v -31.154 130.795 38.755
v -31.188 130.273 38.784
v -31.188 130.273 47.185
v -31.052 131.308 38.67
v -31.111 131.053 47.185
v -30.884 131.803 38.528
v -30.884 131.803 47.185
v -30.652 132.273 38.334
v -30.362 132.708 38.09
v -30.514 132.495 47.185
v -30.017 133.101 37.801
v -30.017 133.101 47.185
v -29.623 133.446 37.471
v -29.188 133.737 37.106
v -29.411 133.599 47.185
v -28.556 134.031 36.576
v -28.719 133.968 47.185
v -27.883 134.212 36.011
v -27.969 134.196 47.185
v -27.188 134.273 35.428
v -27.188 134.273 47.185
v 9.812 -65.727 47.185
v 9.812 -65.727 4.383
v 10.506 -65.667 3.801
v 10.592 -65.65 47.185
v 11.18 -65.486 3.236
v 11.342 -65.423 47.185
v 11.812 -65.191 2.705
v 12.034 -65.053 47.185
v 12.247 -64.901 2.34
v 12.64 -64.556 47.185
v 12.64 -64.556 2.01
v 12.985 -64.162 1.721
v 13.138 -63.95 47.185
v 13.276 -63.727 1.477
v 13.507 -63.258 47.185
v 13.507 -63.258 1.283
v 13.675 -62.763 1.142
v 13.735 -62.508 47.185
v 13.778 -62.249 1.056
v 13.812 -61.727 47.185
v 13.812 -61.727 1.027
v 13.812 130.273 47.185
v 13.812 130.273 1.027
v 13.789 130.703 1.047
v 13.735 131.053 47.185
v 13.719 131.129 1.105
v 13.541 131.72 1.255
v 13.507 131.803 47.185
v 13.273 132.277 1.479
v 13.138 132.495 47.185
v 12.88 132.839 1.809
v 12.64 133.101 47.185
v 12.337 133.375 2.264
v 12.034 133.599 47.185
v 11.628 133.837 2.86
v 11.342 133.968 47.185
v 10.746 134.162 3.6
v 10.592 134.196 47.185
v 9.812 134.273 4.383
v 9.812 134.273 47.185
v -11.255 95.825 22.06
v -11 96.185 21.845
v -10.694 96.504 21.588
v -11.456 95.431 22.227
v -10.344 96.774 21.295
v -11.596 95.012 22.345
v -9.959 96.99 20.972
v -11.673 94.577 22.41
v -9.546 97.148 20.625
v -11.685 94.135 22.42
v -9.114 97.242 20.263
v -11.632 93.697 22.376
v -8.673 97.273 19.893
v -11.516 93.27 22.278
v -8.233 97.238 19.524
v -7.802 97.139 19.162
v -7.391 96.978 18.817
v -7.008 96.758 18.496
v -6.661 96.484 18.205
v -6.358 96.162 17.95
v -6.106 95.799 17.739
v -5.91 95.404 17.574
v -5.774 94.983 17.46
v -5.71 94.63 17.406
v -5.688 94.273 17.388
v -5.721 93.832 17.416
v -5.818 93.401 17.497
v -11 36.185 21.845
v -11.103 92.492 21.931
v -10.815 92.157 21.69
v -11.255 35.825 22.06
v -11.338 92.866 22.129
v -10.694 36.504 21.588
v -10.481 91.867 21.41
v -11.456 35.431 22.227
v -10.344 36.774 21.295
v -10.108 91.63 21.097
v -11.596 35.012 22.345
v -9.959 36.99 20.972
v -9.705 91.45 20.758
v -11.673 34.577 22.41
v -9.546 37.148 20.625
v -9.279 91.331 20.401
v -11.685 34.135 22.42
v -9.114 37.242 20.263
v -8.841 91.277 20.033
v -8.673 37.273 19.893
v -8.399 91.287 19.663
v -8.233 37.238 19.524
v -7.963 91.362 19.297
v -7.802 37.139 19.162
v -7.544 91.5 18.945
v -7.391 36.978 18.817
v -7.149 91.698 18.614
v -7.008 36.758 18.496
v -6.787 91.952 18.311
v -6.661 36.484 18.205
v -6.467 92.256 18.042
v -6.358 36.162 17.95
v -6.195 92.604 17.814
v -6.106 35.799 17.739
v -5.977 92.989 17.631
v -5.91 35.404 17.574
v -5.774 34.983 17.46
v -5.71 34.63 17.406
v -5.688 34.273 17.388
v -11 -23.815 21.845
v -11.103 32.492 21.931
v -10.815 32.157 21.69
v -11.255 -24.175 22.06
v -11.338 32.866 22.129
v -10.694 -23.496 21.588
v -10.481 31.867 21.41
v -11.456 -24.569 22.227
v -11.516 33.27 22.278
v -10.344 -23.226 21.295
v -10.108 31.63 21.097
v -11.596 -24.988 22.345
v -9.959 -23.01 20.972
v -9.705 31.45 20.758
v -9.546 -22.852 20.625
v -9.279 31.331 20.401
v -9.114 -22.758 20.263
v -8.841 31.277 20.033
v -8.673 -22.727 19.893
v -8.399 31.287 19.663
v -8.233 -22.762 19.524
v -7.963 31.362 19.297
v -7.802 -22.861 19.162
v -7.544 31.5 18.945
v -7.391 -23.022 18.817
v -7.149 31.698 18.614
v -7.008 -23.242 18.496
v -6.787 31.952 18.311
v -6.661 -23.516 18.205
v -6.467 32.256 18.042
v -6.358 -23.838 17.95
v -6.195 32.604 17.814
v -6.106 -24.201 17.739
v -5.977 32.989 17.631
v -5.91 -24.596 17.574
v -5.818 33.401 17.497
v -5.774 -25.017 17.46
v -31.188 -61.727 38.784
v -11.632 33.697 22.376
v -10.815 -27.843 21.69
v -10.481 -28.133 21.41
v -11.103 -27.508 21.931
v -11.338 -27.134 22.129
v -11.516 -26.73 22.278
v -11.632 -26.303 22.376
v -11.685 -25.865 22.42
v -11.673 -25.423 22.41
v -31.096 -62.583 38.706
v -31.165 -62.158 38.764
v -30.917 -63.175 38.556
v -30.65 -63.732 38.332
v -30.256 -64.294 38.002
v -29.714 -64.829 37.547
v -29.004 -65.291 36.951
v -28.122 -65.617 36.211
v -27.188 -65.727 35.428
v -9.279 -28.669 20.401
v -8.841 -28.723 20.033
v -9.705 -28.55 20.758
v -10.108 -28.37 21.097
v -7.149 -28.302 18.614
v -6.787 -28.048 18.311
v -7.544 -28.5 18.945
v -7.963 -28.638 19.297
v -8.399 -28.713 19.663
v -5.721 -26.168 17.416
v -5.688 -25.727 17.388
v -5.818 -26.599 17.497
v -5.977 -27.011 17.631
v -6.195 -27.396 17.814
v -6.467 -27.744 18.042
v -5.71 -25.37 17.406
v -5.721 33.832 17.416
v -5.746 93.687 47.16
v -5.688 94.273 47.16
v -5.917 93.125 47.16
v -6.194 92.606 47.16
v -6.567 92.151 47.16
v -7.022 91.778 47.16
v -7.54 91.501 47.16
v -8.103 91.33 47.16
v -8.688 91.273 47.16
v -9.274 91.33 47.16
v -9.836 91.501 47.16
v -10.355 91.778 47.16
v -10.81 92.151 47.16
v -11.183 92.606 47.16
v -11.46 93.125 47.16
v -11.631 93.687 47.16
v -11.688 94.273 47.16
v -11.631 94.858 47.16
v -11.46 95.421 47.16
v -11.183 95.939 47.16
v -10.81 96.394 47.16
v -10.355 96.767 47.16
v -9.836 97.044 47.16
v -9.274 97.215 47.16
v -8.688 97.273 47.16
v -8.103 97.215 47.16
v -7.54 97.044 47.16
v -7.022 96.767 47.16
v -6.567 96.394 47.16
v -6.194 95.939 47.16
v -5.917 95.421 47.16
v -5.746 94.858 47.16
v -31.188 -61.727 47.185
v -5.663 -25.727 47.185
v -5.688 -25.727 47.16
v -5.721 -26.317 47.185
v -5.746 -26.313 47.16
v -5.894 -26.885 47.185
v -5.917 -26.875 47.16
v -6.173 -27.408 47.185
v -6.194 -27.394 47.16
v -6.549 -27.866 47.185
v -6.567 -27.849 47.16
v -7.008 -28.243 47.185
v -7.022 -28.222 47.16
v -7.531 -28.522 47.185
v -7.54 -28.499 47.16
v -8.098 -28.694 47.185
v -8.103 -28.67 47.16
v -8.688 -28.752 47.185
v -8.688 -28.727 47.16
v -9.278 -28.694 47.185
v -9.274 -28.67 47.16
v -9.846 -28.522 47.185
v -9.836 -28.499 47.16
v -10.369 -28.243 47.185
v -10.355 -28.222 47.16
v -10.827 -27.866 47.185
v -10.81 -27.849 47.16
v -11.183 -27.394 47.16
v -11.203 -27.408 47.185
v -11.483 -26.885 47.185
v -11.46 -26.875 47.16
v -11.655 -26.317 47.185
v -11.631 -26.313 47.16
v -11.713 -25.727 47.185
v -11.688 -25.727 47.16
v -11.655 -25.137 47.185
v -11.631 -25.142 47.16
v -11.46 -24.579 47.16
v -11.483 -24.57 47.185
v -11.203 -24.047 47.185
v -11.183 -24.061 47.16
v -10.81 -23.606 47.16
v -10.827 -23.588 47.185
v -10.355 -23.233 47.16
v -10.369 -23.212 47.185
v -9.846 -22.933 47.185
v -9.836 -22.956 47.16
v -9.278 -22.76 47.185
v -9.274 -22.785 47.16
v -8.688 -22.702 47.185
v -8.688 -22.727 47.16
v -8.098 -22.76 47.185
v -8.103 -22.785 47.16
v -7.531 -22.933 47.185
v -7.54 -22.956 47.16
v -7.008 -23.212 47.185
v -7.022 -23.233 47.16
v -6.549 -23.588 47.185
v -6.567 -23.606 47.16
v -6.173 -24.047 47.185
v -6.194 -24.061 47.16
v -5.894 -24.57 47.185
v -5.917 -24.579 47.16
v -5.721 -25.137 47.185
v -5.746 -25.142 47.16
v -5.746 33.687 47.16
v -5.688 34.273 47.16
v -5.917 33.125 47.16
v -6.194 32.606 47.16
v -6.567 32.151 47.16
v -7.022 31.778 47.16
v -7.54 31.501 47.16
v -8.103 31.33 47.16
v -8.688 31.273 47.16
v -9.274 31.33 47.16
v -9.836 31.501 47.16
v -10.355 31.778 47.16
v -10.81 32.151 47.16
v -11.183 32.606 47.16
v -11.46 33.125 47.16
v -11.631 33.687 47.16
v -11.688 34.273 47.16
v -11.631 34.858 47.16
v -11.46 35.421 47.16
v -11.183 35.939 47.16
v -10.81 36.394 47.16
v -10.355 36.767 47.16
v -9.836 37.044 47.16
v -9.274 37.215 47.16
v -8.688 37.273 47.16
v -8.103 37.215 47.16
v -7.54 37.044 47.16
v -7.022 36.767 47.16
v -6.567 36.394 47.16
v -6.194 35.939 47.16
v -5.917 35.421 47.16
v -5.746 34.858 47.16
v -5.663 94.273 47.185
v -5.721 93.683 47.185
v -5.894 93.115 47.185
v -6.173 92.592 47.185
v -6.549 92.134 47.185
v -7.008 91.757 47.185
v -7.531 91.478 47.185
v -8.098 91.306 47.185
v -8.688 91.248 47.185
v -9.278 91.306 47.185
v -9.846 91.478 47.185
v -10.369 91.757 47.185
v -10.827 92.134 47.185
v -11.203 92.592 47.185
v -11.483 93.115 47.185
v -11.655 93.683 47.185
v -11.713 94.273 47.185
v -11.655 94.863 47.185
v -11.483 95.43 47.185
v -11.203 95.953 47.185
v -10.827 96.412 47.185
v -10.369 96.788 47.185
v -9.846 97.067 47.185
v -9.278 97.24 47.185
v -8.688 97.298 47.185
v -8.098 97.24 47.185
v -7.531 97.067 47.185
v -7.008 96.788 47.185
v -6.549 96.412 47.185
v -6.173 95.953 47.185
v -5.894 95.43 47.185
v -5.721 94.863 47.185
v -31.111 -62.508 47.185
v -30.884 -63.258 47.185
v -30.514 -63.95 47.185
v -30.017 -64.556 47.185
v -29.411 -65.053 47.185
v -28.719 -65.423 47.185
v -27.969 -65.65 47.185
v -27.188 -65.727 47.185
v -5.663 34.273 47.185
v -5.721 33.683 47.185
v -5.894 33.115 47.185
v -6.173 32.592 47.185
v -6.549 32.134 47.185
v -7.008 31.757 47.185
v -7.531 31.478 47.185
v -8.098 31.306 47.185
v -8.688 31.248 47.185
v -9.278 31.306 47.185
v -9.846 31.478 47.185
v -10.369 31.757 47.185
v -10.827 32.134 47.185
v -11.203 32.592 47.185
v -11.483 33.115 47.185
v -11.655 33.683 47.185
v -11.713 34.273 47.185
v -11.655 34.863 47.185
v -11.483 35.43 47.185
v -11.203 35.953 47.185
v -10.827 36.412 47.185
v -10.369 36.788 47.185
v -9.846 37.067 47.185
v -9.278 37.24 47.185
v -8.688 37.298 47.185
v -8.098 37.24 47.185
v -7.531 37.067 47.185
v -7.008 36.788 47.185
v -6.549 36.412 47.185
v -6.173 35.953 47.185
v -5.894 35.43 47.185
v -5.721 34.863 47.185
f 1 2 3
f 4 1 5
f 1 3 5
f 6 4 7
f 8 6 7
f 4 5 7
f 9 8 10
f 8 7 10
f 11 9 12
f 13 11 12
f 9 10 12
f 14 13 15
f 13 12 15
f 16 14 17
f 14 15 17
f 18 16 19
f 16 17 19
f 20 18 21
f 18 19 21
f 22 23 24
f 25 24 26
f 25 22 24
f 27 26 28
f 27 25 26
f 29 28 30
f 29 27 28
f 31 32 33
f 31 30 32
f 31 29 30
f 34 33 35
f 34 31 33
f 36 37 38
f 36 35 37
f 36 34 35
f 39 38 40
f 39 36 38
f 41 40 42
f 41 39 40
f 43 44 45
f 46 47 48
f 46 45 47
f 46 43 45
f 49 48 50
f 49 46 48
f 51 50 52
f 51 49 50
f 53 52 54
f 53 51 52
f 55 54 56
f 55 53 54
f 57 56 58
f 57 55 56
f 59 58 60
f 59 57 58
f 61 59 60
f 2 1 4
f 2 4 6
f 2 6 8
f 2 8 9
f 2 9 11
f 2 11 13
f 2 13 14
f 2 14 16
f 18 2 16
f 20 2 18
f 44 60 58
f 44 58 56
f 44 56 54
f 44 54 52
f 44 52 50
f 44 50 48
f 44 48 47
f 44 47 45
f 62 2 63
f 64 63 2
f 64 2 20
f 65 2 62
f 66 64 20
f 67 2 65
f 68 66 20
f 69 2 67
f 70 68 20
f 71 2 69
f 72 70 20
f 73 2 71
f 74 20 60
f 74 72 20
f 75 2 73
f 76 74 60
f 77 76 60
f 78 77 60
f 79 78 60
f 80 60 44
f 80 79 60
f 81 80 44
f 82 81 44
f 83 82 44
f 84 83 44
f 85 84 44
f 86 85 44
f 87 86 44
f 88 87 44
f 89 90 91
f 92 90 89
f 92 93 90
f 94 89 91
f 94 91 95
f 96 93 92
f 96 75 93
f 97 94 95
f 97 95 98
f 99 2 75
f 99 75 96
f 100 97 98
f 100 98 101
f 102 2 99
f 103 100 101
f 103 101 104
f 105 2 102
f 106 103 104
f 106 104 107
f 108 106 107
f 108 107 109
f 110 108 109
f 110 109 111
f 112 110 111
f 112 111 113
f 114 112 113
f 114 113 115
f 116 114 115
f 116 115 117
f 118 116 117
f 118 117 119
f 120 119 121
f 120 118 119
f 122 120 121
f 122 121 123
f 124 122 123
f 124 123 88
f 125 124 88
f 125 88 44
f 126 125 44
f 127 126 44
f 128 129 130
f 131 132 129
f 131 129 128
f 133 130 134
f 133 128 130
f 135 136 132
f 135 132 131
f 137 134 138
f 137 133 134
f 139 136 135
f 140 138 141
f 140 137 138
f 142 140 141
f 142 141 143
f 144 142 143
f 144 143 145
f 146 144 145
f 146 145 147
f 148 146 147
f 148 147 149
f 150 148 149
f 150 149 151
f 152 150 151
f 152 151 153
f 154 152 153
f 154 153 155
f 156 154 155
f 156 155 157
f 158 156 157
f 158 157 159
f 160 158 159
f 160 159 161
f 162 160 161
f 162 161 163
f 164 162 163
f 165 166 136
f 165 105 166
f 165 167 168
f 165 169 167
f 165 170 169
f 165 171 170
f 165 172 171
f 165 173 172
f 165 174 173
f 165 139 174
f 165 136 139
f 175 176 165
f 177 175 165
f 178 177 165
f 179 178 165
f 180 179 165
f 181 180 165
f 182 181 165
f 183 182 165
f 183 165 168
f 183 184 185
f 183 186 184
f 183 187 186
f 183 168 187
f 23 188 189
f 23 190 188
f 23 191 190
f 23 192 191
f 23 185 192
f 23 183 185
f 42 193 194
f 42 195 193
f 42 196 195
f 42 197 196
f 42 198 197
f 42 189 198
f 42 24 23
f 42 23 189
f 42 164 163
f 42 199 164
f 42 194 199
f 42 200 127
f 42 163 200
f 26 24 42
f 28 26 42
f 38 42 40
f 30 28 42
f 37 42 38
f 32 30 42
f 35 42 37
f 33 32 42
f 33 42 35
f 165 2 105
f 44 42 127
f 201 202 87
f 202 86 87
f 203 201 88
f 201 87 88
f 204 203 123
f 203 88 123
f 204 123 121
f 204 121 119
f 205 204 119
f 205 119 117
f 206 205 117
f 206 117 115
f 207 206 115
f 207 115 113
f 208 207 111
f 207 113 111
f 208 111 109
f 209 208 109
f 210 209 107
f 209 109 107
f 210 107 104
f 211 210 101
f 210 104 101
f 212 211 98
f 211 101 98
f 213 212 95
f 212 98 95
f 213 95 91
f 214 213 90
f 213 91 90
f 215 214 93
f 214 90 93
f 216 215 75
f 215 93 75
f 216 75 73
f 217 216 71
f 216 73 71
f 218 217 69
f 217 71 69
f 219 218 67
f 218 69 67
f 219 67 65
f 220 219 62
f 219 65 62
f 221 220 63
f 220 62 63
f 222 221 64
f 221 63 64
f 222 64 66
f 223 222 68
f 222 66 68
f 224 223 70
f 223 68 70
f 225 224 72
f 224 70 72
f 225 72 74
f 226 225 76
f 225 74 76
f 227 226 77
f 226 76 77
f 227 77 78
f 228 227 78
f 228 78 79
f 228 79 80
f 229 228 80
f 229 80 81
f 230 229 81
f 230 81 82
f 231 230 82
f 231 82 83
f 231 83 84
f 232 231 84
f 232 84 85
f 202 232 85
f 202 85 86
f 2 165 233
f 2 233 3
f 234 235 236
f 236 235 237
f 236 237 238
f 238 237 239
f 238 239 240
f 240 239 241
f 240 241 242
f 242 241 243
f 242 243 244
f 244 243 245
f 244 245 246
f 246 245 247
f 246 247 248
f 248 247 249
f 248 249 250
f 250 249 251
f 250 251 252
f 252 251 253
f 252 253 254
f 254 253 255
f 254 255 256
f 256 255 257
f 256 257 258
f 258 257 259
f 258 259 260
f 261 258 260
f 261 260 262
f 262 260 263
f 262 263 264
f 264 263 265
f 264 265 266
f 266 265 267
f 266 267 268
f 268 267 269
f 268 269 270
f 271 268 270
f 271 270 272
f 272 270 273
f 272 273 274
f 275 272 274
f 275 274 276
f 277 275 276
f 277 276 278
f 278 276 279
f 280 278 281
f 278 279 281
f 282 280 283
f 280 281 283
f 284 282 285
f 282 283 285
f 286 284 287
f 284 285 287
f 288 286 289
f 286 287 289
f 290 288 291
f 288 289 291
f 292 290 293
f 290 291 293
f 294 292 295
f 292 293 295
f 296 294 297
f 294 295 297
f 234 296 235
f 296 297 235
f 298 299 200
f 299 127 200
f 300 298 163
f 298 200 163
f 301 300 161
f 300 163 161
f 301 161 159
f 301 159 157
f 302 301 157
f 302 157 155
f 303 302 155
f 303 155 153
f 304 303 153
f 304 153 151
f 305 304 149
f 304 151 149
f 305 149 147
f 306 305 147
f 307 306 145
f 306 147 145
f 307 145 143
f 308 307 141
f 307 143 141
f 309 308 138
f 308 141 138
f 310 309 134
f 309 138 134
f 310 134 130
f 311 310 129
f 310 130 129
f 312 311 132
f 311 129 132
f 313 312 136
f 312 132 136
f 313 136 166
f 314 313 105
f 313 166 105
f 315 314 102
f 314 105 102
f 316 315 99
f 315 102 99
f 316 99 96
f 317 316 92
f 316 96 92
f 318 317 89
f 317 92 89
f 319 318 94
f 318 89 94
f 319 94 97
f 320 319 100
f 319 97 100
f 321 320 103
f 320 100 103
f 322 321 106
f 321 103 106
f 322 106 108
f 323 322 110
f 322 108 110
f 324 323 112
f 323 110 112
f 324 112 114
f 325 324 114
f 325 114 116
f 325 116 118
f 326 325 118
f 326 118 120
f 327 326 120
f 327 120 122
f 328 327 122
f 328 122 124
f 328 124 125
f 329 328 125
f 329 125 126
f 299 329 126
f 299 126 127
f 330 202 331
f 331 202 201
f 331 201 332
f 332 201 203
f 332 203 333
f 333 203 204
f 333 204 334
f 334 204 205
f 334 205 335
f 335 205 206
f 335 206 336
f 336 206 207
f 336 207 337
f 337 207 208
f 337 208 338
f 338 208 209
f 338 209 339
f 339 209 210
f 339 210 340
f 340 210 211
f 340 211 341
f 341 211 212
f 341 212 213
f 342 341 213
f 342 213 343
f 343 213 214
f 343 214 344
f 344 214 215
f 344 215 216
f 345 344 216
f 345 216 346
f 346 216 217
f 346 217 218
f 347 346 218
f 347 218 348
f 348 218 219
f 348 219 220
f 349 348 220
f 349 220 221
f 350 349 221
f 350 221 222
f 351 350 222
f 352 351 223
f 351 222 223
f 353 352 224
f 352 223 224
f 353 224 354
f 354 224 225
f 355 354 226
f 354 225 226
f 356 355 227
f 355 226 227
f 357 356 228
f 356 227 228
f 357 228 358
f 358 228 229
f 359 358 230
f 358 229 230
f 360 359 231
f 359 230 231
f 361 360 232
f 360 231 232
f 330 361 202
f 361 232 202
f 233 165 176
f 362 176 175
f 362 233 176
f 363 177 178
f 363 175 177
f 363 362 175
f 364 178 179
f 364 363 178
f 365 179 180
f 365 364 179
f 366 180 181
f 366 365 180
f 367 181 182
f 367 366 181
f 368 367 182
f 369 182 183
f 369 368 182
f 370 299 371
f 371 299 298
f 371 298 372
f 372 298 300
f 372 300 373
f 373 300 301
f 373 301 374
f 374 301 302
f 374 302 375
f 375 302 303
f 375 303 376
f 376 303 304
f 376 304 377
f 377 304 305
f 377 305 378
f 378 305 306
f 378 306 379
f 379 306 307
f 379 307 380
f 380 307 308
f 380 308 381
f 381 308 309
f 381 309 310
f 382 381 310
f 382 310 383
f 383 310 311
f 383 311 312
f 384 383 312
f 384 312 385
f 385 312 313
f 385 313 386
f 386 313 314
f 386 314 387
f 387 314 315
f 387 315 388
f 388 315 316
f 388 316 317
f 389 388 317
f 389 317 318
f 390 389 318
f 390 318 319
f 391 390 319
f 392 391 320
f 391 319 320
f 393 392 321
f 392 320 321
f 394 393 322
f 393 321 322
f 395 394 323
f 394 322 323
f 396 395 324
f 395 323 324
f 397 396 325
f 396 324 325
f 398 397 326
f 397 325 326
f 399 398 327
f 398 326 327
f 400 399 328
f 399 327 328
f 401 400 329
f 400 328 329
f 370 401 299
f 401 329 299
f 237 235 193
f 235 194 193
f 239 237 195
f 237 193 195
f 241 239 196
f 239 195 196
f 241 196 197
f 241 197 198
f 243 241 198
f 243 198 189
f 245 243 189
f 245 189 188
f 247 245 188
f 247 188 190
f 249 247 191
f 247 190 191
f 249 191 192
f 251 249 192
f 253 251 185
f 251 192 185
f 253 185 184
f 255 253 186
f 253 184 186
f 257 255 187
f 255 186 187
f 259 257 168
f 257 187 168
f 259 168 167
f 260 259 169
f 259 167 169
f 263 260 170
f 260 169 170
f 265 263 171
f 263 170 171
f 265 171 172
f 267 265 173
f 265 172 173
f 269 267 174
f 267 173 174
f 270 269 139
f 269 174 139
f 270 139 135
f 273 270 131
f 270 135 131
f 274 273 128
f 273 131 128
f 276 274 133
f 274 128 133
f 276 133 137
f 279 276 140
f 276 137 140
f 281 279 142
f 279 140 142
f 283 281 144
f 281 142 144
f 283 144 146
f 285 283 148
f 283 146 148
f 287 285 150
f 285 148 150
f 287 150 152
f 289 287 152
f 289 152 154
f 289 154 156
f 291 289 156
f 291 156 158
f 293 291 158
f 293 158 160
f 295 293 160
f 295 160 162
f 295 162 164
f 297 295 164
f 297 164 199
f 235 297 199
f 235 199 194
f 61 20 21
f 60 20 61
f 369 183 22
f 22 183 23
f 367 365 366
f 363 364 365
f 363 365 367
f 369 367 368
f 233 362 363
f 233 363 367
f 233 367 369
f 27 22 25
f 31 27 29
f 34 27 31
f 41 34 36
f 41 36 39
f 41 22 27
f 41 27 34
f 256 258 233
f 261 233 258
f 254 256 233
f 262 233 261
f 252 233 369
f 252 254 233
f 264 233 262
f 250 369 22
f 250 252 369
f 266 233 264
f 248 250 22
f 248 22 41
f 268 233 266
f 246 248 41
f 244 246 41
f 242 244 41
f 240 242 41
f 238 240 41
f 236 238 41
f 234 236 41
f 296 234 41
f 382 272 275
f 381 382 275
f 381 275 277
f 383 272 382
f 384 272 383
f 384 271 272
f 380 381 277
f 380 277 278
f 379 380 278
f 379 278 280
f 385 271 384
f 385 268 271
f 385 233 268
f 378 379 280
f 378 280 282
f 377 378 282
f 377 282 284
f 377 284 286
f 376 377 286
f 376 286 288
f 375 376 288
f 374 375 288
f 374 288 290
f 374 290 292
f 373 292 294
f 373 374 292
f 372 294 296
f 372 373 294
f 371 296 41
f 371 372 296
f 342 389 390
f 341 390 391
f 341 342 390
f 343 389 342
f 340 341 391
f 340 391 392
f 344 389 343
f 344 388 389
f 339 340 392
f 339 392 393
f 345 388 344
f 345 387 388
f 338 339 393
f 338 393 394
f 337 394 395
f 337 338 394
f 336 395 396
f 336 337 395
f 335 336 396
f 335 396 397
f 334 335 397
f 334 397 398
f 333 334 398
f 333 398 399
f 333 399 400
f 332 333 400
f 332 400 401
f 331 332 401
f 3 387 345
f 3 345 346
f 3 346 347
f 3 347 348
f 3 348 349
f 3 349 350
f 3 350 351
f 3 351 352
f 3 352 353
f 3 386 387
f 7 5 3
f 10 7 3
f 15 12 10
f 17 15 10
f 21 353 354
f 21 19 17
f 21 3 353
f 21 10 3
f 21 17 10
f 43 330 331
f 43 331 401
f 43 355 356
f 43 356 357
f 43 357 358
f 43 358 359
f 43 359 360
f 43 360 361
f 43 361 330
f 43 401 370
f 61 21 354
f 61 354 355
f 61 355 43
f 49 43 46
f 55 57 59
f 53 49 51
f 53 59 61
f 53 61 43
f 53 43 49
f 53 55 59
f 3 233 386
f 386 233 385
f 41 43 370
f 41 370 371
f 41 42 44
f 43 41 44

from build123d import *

# Parameters (mm, degrees)
SKETCH1_W                      = 45
SKETCH1_H                      = 200
BOSS_EXTRUDE1_DEPTH            = 500
FILLET1_R                      = 4
CUT_EXTRUDE3_DEPTH             = 540.418860697
CUT_EXTRUDE3_DEPTH_BACK        = 540.418860697
CUT_EXTRUDE4_DEPTH             = 540.418860697
CUT_EXTRUDE4_DEPTH_BACK        = 540.418860697
CUT_EXTRUDE5_DEPTH             = 540.418860697
CUT_EXTRUDE5_DEPTH_BACK        = 540.418860697
CUT_EXTRUDE7_DEPTH             = 540.418860697
CUT_EXTRUDE7_DEPTH_BACK        = 540.418860697
F_6_0MM_DOWEL_SLOT_D           = 6
F_6_0MM_DOWEL_SLOT_DEPTH       = 128.197418143
F_6_0MM_DOWEL_SLOT_CSINK_D     = 6.05
F_6_0MM_DOWEL_SLOT_CSINK_ANGLE = 90
F_6_0MM_DOWEL_SLOT_TIP         = 1.802581857


with BuildPart() as part:
    # Sketch1 → Boss-Extrude1 (new body)
    with BuildSketch(Plane.XY):
        with Locations((-8.688255411, 34.272684877)):
            Rectangle(SKETCH1_W, SKETCH1_H)
    extrude(amount=BOSS_EXTRUDE1_DEPTH)

    # Fillet1
    fillet1_edges = [part.edges().sort_by_distance(p)[0] for p in [
        (13.811744589, 134.272684877, 250),
        (13.811744589, -65.727315123, 250),
        (-31.188255411, -65.727315123, 250),
        (-31.188255411, 134.272684877, 250),
    ]]
    fillet(fillet1_edges, radius=FILLET1_R)

    # Sketch4 → Cut-Extrude3 (cut, two sides: drawn at the far end of the back side and taken through both)
    with BuildSketch(Plane(origin=(0, 134.272684877, 0), x_dir=(1, 0, 0), z_dir=(0, 1, 0)).offset(-CUT_EXTRUDE3_DEPTH_BACK)):
        Polygon((-954.529416546, -60.37823327), (-31.188255411, -479.570237952), (13.811744589, -500), (937.152905724, -919.192004683), (98.768896358, -2765.874326953), (-1792.913425912, -1907.060555539), align=None)
    extrude(amount=CUT_EXTRUDE3_DEPTH + CUT_EXTRUDE3_DEPTH_BACK, mode=Mode.SUBTRACT)

    # Sketch5 → Cut-Extrude4 (cut, two sides: drawn at the far end of the back side and taken through both)
    with BuildSketch(Plane(origin=(0, 134.272684877, 0), x_dir=(1, 0, 0), z_dir=(0, 1, 0)).offset(-CUT_EXTRUDE4_DEPTH_BACK)):
        Polygon((781.934937979, 662.017821823), (13.811744589, 0), (-31.188255411, -38.7838855), (-799.311448802, -700.801707323), (-2123.347092448, 835.444679459), (-542.100705666, 2198.264208604), align=None)
    extrude(amount=CUT_EXTRUDE4_DEPTH + CUT_EXTRUDE4_DEPTH_BACK, mode=Mode.SUBTRACT)

    # Sketch6 → Cut-Extrude5 (cut, two sides: drawn at the far end of the back side and taken through both)
    with BuildSketch(Plane(origin=(0, 134.272684877, 0), x_dir=(1, 0, 0), z_dir=(0, 1, 0)).offset(-CUT_EXTRUDE5_DEPTH_BACK)):
        Polygon((-806.445941811, -689.253490297), (-31.188255411, -38.7838855), (13.811744589, -1.027236672), (789.069430988, 649.442368125), (-511.869778607, 2199.957740924), (-2107.385151405, 861.261882502), align=None)
    extrude(amount=CUT_EXTRUDE5_DEPTH + CUT_EXTRUDE5_DEPTH_BACK, mode=Mode.SUBTRACT)

    # Sketch7 → Cut-Extrude7 (cut, two sides: drawn at the far end of the back side and taken through both)
    with BuildSketch(Plane(origin=(0, -65.727315123, 0), x_dir=(-1, 0, 0), z_dir=(0, -1, 0)).offset(-CUT_EXTRUDE7_DEPTH_BACK)):
        Polygon((951.279102129, -47.185095961), (31.188255411, -47.185095961), (-13.811744589, -47.185095961), (-933.902591306, -47.185095961), (-933.902591306, -1887.366789396), (951.279102129, -1887.366789396), align=None)
    extrude(amount=CUT_EXTRUDE7_DEPTH + CUT_EXTRUDE7_DEPTH_BACK, mode=Mode.SUBTRACT)

    # Ø6.0mm Dowel Slot
    with Locations(Plane(origin=(1239.161696342, 134.272684877, 47.185095961), x_dir=(-1, 0, 0), z_dir=(0, 0, 1))):
        with Locations((1247.849951753, 160), (1247.849951753, 100), (1247.849951753, 40)):
            CounterSinkHole(F_6_0MM_DOWEL_SLOT_D / 2, F_6_0MM_DOWEL_SLOT_CSINK_D / 2, depth=F_6_0MM_DOWEL_SLOT_DEPTH, counter_sink_angle=F_6_0MM_DOWEL_SLOT_CSINK_ANGLE)
            with Locations((0, 0, -(F_6_0MM_DOWEL_SLOT_DEPTH + F_6_0MM_DOWEL_SLOT_TIP / 2))):  # 118° drill point
                Cone(0, F_6_0MM_DOWEL_SLOT_D / 2, F_6_0MM_DOWEL_SLOT_TIP, mode=Mode.SUBTRACT)


solid = part.part
